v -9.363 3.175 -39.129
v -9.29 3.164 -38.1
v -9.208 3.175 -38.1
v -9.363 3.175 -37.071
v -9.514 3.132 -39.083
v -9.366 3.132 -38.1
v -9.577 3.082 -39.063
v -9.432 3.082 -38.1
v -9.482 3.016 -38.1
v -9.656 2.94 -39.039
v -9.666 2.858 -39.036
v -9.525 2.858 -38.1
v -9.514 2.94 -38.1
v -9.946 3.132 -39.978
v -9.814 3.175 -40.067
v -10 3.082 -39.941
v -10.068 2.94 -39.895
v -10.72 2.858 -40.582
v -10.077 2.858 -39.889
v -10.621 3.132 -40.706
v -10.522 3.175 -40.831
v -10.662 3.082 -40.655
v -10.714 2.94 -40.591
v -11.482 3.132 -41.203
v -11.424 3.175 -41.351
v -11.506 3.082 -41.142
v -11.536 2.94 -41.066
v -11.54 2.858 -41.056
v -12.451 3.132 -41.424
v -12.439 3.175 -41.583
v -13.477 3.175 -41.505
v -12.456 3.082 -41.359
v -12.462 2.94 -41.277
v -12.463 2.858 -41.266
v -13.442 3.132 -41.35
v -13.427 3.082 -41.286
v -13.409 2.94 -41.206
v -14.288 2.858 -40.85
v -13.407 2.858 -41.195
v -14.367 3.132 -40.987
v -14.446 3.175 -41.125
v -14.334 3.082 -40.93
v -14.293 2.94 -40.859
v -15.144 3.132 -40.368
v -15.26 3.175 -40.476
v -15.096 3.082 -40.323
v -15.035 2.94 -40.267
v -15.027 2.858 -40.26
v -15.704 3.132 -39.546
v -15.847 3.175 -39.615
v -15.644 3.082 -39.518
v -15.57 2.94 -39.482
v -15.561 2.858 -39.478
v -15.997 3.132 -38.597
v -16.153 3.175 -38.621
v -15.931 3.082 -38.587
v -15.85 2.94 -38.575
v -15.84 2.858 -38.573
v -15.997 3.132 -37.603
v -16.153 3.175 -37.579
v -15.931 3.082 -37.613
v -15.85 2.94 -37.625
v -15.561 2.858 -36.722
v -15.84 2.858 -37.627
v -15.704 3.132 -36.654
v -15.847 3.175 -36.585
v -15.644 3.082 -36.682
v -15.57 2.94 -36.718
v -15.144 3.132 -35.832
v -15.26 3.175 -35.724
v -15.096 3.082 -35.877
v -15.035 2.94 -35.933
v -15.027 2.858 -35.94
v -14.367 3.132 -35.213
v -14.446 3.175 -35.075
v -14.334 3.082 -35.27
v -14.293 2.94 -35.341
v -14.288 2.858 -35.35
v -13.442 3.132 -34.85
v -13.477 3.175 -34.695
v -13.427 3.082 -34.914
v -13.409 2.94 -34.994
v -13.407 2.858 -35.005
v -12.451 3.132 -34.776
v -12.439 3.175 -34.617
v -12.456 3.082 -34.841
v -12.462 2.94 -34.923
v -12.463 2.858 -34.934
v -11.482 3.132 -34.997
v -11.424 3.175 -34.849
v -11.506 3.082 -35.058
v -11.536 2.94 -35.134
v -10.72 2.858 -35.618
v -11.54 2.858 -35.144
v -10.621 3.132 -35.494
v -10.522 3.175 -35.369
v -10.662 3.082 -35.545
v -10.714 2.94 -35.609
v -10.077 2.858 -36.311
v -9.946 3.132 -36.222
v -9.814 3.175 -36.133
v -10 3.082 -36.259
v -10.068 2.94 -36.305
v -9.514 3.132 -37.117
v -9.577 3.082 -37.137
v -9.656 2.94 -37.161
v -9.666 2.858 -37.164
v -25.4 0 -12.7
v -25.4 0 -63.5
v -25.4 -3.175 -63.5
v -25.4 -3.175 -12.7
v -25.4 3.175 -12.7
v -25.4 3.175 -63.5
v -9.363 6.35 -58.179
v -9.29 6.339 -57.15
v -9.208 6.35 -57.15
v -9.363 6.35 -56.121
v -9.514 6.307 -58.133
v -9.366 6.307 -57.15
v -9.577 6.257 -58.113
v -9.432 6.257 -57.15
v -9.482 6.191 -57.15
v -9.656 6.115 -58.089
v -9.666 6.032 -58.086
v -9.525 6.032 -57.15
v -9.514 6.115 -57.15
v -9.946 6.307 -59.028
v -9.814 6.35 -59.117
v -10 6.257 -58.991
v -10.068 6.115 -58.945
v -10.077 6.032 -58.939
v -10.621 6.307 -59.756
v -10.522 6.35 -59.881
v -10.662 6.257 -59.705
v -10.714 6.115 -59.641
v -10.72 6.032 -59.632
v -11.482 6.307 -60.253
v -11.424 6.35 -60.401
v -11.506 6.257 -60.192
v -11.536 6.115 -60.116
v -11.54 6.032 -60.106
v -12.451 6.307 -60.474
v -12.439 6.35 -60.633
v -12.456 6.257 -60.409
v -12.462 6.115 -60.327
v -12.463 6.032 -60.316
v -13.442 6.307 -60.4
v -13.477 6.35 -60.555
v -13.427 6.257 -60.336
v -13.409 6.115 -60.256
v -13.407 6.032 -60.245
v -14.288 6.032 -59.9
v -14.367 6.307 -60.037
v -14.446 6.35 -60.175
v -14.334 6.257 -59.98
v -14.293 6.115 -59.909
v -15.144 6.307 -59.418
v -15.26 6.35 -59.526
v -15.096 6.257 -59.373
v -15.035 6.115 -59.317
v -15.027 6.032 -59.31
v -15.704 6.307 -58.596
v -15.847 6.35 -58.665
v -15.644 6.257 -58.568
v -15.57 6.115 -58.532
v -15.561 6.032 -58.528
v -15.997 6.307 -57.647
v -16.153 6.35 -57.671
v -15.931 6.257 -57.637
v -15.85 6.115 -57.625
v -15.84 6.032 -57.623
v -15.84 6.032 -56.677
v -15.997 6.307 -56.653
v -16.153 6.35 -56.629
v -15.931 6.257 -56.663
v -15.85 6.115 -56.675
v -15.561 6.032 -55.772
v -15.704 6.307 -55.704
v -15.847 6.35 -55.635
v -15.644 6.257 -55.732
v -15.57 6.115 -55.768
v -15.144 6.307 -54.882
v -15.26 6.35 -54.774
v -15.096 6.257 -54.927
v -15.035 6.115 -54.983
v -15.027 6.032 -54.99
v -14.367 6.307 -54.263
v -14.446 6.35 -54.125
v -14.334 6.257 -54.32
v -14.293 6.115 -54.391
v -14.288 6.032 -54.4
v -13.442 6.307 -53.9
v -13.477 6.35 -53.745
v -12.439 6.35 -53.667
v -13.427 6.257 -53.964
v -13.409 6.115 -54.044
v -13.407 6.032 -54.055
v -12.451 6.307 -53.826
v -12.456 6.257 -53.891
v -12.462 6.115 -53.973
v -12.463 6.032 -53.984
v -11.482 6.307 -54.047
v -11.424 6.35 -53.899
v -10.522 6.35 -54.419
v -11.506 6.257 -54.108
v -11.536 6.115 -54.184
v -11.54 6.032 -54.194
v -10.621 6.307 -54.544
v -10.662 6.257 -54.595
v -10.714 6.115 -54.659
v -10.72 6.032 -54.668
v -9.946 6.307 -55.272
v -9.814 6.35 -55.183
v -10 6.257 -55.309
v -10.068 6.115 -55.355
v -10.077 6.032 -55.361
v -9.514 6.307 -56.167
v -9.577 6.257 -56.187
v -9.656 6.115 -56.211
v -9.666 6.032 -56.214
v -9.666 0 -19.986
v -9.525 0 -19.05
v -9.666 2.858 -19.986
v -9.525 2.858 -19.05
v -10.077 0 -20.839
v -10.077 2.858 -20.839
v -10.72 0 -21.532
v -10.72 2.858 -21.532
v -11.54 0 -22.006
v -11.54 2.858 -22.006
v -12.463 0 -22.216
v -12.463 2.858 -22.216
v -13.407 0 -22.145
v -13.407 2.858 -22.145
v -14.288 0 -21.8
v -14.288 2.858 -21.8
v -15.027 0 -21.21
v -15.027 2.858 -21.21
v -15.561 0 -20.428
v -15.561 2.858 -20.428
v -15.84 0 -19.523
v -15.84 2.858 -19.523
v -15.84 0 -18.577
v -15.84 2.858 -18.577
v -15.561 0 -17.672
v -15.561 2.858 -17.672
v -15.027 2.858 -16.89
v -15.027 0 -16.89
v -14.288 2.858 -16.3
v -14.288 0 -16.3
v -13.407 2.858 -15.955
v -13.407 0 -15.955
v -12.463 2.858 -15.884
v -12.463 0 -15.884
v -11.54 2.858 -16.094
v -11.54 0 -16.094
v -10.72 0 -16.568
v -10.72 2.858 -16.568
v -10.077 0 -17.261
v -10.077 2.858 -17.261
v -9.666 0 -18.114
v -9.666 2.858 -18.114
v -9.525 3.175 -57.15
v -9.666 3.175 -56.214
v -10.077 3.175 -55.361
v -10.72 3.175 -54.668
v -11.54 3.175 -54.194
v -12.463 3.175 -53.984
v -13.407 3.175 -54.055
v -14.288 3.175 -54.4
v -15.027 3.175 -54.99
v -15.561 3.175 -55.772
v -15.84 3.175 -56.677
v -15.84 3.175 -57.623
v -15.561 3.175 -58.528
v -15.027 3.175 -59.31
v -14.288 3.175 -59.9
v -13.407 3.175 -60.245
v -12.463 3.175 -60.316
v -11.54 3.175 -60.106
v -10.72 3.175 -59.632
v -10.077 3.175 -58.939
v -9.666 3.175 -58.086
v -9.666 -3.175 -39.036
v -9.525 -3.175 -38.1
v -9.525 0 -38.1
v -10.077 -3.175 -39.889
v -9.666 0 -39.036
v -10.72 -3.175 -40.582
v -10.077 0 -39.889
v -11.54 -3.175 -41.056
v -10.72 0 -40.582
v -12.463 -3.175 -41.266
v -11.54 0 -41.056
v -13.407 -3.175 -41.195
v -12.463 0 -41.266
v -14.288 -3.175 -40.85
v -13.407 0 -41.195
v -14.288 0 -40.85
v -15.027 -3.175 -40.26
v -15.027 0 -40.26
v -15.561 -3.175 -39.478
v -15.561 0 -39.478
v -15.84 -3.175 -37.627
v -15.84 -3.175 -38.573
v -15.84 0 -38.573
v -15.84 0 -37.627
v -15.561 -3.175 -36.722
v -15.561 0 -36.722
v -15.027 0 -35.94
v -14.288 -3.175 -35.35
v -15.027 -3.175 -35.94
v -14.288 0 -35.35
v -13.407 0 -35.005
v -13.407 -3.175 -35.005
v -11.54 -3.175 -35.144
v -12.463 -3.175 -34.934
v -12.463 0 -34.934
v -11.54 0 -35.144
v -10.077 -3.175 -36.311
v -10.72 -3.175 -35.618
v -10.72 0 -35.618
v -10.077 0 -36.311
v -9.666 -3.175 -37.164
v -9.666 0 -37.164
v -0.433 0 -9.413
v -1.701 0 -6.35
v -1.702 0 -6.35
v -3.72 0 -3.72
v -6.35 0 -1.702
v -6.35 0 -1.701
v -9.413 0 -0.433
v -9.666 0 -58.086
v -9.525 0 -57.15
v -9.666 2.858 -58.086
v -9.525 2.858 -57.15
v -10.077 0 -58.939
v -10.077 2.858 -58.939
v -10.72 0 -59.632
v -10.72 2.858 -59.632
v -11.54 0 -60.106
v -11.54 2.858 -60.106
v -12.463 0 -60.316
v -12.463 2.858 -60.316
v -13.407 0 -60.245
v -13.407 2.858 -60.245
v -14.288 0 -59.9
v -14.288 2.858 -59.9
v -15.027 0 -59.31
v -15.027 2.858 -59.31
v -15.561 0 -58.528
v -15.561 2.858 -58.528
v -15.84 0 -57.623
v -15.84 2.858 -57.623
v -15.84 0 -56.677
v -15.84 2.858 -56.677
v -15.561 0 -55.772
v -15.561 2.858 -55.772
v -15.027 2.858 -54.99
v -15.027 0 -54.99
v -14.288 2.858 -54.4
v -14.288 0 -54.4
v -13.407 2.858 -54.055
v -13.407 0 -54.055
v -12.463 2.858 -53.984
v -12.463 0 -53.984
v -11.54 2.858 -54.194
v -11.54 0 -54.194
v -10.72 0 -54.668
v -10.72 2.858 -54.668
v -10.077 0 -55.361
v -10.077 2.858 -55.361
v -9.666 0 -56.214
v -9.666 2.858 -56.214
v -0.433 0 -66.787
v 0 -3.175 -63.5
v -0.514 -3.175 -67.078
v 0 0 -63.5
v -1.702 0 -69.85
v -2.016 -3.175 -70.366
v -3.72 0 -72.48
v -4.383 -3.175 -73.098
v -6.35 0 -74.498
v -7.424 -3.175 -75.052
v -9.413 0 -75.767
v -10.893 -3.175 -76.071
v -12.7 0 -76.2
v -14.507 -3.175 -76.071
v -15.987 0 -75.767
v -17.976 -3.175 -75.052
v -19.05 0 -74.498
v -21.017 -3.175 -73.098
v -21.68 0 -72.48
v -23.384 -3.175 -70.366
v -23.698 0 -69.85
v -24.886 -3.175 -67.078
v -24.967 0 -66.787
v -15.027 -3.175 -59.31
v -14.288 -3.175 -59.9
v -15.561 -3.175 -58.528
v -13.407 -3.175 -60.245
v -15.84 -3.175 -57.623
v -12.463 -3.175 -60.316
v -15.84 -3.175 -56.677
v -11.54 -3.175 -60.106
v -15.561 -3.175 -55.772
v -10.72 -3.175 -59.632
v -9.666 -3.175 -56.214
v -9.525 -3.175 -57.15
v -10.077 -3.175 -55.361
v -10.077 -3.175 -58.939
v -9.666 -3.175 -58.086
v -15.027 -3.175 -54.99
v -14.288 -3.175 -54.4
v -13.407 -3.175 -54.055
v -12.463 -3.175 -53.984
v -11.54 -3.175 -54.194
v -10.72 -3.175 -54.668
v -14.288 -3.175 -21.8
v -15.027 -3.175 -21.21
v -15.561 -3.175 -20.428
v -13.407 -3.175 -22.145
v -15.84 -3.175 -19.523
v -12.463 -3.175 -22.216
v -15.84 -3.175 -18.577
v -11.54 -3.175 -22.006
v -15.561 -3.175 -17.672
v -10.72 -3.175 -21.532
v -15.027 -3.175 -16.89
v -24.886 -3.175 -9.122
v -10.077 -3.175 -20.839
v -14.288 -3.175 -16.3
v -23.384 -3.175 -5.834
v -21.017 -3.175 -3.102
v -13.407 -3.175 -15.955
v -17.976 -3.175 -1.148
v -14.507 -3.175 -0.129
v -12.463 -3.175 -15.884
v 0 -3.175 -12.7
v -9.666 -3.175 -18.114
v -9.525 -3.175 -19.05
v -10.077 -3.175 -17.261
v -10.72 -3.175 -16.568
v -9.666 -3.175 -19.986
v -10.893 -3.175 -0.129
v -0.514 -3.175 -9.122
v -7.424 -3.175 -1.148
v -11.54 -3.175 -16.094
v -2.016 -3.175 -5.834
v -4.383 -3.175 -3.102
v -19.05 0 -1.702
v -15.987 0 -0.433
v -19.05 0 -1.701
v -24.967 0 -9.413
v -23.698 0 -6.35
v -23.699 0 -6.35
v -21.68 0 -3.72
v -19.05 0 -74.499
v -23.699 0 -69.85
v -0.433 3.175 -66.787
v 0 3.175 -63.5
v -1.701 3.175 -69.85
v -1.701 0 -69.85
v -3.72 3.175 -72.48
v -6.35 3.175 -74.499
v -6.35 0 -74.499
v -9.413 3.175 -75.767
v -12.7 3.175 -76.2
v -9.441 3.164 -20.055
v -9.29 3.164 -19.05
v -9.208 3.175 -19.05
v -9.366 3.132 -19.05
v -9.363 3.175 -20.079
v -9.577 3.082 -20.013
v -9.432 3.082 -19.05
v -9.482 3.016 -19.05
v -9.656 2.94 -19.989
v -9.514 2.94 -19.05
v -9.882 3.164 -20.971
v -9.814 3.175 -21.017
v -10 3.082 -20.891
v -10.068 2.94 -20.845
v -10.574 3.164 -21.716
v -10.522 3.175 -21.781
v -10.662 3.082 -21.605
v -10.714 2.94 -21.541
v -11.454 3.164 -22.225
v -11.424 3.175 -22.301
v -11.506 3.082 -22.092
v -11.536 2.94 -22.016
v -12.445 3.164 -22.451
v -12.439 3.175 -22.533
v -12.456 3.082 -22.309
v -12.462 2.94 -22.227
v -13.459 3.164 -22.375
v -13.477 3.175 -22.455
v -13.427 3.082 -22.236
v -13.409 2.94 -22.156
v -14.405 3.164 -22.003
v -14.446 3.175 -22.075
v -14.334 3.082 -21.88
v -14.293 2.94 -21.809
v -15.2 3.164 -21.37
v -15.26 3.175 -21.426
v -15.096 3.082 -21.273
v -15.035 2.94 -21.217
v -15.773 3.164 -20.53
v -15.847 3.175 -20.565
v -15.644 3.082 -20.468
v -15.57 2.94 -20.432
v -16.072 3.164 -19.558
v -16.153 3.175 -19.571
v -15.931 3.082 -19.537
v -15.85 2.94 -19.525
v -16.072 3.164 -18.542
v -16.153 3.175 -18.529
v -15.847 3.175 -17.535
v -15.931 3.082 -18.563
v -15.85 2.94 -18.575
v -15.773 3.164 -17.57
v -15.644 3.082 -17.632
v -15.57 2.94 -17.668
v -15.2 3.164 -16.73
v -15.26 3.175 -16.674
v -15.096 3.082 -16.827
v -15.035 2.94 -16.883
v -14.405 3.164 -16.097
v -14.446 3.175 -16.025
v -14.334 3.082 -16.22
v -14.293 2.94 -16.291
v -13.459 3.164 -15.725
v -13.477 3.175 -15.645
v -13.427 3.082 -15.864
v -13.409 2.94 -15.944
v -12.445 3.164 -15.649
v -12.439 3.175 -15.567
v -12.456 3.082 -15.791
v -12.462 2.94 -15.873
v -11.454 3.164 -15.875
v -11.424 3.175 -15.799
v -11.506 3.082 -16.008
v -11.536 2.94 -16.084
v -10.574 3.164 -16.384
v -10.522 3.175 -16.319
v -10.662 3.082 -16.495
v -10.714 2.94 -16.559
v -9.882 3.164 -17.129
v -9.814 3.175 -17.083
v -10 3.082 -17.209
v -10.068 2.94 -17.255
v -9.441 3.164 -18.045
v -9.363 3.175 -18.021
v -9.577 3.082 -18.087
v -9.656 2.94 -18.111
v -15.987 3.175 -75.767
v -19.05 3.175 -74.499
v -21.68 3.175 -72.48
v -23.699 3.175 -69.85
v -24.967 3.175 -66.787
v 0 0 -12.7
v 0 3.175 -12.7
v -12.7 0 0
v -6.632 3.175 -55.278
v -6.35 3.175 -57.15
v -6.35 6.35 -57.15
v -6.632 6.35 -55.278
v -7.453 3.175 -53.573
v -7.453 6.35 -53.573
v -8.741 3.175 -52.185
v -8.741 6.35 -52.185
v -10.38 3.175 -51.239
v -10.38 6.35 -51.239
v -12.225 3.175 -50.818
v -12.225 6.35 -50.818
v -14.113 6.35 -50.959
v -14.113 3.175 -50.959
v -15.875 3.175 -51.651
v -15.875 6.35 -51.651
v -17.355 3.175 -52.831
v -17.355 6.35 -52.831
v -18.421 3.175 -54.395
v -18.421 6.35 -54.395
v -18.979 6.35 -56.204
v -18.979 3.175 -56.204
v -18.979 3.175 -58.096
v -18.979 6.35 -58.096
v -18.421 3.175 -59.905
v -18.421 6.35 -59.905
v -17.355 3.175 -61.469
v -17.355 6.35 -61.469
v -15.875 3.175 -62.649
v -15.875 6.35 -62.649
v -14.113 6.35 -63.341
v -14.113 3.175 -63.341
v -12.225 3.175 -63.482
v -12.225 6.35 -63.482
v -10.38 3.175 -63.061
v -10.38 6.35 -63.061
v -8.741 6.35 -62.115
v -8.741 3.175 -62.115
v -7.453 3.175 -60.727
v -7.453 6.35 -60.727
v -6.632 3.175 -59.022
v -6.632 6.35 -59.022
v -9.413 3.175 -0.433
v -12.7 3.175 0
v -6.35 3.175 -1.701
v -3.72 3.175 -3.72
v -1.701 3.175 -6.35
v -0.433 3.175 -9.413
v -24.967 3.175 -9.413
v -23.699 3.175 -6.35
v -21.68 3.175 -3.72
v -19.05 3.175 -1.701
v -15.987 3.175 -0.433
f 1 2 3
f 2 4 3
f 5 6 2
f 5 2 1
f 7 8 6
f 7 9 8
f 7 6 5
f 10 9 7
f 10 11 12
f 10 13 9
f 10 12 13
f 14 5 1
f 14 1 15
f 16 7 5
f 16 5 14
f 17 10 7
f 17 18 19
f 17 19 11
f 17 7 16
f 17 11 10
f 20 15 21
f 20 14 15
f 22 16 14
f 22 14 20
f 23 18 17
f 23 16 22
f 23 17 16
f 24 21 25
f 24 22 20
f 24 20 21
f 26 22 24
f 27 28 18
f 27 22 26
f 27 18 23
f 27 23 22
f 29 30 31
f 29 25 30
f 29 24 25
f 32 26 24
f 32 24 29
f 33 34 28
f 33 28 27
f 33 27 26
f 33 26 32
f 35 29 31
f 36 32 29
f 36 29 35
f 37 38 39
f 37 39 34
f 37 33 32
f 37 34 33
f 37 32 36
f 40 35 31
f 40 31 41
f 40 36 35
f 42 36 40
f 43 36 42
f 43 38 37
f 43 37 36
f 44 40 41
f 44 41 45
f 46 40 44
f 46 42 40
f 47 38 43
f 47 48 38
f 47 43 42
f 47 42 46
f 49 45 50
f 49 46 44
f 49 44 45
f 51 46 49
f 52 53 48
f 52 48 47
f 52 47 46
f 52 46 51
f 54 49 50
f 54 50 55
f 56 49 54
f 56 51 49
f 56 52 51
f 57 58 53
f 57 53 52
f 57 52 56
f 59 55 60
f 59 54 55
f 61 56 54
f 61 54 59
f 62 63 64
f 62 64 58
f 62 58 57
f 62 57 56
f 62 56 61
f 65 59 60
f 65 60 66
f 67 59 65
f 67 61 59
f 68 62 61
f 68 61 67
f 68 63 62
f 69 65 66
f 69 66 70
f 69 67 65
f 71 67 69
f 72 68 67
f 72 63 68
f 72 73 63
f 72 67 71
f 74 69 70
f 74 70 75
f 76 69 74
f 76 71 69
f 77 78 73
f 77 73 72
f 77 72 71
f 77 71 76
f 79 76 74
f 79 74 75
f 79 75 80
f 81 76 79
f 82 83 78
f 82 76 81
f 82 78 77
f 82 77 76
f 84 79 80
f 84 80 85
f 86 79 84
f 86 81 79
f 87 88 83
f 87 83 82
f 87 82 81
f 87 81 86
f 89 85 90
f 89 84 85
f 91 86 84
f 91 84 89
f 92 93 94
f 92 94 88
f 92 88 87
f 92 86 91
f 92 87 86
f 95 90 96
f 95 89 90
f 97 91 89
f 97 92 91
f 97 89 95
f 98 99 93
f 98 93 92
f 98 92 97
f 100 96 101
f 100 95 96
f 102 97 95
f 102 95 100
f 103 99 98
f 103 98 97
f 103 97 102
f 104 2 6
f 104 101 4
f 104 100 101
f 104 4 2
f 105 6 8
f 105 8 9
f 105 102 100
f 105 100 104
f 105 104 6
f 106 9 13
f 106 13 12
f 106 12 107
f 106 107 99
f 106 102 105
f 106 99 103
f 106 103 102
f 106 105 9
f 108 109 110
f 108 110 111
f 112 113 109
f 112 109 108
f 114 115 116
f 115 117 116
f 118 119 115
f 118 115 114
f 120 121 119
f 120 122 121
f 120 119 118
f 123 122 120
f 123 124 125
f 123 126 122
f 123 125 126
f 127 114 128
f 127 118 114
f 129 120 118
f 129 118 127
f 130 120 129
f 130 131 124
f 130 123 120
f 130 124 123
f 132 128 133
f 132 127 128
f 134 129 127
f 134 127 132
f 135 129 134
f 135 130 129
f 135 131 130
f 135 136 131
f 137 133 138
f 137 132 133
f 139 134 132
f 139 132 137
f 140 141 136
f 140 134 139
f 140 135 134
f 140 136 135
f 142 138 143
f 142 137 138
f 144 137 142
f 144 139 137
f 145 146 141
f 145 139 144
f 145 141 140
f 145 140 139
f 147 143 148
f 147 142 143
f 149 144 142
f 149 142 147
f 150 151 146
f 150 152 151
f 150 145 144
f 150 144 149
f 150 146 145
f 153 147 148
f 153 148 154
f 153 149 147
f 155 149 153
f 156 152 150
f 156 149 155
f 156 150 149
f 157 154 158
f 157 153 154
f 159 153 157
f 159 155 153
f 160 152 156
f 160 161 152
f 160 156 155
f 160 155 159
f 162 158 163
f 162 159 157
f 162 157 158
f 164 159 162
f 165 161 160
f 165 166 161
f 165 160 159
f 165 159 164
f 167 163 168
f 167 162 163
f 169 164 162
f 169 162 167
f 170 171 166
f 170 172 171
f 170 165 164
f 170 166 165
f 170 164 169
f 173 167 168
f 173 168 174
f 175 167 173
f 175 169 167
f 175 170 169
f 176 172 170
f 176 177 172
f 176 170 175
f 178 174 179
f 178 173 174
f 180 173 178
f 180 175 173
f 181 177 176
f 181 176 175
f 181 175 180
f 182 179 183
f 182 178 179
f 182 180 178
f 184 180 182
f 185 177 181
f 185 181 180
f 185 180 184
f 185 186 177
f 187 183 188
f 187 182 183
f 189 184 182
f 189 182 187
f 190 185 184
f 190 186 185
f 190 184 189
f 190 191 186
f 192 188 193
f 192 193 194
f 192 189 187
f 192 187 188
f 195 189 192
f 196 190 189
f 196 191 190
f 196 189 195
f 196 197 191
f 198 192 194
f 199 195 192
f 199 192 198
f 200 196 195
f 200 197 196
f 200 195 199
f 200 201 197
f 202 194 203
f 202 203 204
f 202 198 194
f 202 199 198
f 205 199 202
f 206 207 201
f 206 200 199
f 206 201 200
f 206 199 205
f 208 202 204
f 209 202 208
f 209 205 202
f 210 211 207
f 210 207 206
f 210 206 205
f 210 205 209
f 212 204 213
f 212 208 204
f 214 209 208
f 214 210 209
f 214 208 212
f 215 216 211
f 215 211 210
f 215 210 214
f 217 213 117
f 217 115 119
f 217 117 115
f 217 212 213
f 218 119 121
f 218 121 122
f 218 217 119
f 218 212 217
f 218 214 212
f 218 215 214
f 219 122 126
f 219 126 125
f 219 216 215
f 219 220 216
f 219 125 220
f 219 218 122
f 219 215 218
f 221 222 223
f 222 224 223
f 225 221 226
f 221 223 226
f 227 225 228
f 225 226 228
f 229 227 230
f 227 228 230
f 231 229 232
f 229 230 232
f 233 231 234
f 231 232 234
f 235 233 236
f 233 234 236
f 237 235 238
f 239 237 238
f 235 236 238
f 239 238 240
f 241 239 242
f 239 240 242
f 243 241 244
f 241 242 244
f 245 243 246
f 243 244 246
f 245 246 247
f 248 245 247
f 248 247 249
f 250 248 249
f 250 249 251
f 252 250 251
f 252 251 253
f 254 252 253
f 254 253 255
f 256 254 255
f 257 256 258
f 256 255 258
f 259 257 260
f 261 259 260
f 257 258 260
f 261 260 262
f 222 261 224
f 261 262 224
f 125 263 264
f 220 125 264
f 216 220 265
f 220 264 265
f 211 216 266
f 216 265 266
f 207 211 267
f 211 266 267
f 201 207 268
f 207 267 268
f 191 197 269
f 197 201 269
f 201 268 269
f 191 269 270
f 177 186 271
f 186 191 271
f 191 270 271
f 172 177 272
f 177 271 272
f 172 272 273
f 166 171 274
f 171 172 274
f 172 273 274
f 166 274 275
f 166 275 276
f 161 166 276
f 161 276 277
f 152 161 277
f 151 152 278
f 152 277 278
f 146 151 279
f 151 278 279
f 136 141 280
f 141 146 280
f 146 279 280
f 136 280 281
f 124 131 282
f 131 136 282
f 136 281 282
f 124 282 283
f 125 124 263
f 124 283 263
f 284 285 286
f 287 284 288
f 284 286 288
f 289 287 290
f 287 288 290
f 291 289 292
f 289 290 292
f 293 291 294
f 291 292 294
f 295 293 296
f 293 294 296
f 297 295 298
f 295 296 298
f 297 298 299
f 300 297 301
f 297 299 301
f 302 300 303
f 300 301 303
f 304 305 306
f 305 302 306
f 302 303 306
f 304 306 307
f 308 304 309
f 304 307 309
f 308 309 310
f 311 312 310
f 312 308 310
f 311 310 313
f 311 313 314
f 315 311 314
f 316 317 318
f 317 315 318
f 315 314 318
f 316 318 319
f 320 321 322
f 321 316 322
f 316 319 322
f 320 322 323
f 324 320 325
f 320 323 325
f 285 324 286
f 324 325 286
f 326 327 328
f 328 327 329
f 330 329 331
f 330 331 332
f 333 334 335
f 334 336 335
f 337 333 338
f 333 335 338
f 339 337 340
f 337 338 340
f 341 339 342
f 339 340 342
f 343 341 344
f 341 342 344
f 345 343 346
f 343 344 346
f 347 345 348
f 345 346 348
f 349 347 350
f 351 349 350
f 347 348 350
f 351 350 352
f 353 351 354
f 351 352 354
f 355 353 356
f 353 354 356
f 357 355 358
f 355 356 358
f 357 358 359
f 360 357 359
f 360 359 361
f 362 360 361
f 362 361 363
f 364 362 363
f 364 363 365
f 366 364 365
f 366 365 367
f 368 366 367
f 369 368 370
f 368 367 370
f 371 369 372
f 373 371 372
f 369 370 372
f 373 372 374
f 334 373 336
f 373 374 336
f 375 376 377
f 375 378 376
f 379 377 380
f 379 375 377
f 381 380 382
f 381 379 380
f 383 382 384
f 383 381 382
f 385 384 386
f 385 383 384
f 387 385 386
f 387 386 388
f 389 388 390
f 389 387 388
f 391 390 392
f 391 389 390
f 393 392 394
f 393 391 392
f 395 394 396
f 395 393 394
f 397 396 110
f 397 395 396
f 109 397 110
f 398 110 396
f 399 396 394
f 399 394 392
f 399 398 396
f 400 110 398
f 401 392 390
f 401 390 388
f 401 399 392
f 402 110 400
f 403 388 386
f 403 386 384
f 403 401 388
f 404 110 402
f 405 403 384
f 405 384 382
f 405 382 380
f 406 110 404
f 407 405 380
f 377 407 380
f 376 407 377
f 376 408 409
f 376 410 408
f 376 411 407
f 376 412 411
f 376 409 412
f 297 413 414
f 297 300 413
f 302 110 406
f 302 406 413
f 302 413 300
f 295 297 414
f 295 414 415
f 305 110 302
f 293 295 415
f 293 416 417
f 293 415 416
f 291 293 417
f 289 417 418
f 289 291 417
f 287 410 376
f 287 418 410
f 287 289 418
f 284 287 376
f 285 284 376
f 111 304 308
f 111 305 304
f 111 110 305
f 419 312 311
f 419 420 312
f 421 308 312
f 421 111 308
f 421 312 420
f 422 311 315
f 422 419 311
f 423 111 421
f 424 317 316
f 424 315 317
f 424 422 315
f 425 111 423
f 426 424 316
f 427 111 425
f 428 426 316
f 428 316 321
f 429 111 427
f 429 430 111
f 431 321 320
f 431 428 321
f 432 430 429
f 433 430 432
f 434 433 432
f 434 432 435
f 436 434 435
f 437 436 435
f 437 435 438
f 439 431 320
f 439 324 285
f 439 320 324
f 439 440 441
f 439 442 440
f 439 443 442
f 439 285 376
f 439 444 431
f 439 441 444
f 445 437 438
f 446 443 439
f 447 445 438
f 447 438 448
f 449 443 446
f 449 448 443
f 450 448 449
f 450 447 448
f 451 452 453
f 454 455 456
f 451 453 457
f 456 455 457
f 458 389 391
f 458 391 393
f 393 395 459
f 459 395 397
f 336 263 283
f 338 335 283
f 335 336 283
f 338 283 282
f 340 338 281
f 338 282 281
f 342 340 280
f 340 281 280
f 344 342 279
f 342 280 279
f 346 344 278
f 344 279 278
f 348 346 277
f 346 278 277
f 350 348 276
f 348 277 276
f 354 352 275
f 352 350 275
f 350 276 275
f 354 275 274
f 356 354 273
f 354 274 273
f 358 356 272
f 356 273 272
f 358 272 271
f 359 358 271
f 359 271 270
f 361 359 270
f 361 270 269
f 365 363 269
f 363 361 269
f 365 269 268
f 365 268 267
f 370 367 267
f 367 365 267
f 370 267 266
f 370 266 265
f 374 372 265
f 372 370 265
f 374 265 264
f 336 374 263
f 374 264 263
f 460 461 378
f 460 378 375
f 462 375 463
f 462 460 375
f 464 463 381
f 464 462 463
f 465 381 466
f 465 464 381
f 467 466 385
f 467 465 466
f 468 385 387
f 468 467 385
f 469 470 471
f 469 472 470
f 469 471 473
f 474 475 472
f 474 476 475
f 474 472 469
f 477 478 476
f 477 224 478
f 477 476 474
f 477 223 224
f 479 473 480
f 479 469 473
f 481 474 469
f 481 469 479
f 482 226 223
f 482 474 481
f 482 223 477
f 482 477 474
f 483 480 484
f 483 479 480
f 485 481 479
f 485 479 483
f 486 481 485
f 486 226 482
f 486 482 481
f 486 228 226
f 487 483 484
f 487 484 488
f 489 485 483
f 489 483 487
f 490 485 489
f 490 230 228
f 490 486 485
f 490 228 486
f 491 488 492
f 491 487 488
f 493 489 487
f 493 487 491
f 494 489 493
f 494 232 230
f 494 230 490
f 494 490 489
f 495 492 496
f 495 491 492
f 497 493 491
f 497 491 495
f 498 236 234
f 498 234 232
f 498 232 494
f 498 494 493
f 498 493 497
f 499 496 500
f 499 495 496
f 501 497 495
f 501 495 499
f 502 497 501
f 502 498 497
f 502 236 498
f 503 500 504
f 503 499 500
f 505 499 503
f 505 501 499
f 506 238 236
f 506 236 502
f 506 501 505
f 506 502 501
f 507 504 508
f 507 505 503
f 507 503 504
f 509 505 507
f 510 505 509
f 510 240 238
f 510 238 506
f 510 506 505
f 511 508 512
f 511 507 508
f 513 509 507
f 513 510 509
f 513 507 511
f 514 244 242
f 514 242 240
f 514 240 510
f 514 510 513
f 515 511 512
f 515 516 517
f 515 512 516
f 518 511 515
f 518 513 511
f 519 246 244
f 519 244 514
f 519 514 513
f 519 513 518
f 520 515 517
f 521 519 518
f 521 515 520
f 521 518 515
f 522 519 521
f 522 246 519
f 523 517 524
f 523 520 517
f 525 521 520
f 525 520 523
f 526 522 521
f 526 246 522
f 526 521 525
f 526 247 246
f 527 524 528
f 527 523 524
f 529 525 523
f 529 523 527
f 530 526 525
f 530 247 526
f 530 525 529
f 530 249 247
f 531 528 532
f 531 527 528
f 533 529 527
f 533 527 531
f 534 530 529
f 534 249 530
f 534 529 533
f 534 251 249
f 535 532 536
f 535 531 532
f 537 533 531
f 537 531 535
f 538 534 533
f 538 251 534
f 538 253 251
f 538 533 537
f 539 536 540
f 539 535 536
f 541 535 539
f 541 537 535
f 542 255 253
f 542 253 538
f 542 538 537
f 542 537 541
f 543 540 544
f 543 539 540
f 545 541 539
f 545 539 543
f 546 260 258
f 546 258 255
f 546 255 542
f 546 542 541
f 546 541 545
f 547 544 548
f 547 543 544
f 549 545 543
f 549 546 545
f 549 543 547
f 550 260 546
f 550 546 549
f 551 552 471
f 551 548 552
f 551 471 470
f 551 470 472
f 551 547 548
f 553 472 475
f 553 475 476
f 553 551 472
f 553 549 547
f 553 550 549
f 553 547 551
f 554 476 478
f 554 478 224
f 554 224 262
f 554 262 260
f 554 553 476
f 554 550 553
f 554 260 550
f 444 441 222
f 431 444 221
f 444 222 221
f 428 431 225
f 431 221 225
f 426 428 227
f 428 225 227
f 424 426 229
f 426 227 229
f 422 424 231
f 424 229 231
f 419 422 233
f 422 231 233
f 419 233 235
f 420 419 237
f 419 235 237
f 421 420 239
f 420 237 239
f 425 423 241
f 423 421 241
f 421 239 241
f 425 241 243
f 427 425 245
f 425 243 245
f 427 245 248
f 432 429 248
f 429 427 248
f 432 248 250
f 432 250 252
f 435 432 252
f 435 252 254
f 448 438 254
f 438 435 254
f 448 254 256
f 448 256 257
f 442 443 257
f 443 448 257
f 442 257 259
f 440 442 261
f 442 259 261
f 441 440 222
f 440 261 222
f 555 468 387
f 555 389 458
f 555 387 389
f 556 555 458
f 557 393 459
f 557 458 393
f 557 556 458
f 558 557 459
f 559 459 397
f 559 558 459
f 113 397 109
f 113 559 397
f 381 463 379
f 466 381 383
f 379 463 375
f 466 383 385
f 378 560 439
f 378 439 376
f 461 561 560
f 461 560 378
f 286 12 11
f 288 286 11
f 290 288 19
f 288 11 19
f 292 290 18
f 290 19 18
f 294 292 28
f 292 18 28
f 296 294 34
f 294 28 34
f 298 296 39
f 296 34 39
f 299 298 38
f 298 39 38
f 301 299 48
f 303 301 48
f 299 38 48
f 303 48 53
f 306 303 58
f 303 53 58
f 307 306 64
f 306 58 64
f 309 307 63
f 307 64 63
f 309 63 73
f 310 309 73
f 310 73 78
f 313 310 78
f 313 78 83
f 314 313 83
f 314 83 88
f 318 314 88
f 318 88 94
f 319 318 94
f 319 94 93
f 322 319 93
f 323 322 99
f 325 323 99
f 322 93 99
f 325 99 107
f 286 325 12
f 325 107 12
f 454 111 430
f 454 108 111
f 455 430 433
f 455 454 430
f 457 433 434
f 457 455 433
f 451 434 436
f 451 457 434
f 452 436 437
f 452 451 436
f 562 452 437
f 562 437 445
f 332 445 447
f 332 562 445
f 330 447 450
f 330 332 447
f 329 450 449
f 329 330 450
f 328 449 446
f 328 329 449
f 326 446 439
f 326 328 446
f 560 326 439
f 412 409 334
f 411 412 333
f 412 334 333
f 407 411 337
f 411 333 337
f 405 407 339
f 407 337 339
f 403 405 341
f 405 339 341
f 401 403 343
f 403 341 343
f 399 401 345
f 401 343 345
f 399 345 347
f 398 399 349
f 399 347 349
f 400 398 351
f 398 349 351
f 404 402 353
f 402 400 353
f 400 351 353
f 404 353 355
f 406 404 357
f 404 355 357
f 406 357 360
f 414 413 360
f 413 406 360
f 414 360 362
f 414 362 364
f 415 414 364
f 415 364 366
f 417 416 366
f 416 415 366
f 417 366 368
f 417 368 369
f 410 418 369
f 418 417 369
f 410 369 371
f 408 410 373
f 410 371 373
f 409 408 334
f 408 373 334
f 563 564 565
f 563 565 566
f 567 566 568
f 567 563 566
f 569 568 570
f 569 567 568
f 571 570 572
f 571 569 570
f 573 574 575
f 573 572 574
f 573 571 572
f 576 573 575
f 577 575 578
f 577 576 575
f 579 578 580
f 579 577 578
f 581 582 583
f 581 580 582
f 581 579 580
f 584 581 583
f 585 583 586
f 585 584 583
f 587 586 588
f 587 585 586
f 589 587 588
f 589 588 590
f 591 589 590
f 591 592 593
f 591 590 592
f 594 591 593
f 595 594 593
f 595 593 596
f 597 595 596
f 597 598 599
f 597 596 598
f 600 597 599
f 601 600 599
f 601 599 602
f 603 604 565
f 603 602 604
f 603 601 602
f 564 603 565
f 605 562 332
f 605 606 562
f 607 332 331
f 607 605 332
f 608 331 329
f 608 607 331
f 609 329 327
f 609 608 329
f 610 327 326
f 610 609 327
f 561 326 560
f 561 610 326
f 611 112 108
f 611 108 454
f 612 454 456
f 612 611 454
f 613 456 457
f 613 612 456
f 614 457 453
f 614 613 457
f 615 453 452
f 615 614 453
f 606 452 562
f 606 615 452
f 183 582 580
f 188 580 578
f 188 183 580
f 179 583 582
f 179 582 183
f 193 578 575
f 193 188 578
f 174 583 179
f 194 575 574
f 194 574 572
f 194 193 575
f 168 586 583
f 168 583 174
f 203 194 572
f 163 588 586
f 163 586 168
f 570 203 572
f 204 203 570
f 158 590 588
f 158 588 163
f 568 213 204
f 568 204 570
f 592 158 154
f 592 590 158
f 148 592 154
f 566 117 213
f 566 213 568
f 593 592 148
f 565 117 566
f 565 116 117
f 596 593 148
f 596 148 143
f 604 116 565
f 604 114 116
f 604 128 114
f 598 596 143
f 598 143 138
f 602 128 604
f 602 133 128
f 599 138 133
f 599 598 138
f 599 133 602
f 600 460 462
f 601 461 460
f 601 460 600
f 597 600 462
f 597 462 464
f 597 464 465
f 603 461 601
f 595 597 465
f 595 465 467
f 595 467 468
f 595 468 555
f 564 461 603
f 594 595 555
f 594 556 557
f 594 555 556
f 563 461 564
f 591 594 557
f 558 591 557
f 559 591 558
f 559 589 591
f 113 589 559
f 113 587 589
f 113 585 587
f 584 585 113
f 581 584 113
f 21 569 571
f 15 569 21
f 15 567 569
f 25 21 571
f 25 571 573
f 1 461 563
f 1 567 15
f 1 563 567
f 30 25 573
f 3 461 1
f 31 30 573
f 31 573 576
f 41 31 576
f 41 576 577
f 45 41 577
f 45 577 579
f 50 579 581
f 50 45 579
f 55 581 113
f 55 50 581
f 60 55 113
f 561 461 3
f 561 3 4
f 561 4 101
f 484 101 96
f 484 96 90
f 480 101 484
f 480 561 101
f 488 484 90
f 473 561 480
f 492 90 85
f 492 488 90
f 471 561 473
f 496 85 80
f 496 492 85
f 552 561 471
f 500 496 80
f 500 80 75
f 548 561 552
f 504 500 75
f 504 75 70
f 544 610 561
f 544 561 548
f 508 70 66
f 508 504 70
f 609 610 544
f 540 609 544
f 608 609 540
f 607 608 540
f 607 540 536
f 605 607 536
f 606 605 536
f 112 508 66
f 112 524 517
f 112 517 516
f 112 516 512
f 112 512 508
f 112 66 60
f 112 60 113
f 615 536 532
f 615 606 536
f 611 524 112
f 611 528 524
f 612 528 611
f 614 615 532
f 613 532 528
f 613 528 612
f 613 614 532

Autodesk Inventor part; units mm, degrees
ref_plane "YZ Plane" through (0, 0, 0) normal (1, 0, 0) x (0, 1, 0)
ref_plane "XZ Plane" through (0, 0, 0) normal (0, 1, 0) x (-1, 0, 0)
ref_plane "XY Plane" through (0, 0, 0) normal (0, 0, 1) x (1, 0, 0)
sketch "Sketch1" plane through (0, 0, 0) normal (0, 1, 0) x (-1, 0, 0)
  line L0 (0, 0) -> (25.4, 0)
  line L1 (25.4, 0) -> (25.4, -76.2)
  line L2 (25.4, -76.2) -> (0, -76.2)
  line L3 (0, -76.2) -> (0, 0)
  dimension "d0" = 25.4
  dimension "d1" = 76.2
extrude "Extrusion1" add sketch "Sketch1" along normal blind 3.175
sketch "Sketch2" plane through (0, 3.175, 0) normal (0, 1, 0) x (1, 0, 0)
  line L0 (-25.4, 76.2) -> (-25.4, 0) projected
  line L1 (0, 76.2) -> (-25.4, 76.2) projected
  line L2 (-25.4, 0) -> (0, 76.2)
  line L3 (0, 76.2) -> (-25.4, 76.2)
  line L4 (-25.4, 76.2) -> (0, 0)
  line L5 (0, 0) -> (-12.7, 38.1)
  line L6 (-25.4, 0) -> (0, 0) projected
  line L7 (-12.7, 0) -> (-12.7, 76.2)
  circle A0 centre (-12.7, 38.1) radius 3.175
  line L8 (-12.7, 38.1) -> (-12.7, 0)
  circle A1 centre (-12.7, 19.05) radius 3.175
  line L9 (-12.7, 38.1) -> (-12.7, 76.2)
  circle A2 centre (-12.7, 57.15) radius 3.175
  dimension "d4" = 6.35
  dimension "d5" = 6.35
  dimension "d6" = 6.35
extrude "Extrusion2" cut sketch "Sketch2" against normal blind 3.175 contours A0 L7 L4 | L4 L2 A0 | L2 L7 A0 | A2 L7 | L7 A2 | L7 A0 L2 | L2 A0 L4 | L4 A0 L7 | A1 L7 | L7 A1
fillet "Fillet1" radius 12.7 4 edges at (0, 1.5875, 0) (-25.4, 1.5875, 0) (0, 1.5875, -76.2) (-25.4, 1.5875, -76.2)
fillet "Fillet2" radius 0.3175 3 edges at (-15.875, 3.175, -57.15) (-15.875, 3.175, -38.1) (-15.875, 3.175, -19.05)
sketch "Sketch3" plane through (0, 3.175, 0) normal (0, 1, 0) x (1, 0, 0)
  circle A0 centre (-12.7, 57.15) radius 3.175 projected
  circle A1 centre (-12.7, 57.15) radius 6.35
  point P0 (0, 0)
  dimension "d11" = 12.7
extrude "Extrusion3" add sketch "Sketch3" along normal blind 3.175
sketch "Sketch4" plane through (-12.7, 6.35, -57.15) normal (0, 1, 0) x (1, 0, 0)
  circle A0 centre (0, 0) radius 6.35 projected
  circle A1 centre (0, 0) radius 3.175 projected
  point P0 (12.7, -57.15)
extrude "Extrusion4" add sketch "Sketch4" against normal through all
fillet "Fillet3" radius 0.3175 1 edges at (-15.875, 6.35, -57.15)
sketch "Sketch5" plane through (0, 0, 0) normal (0, -1, 0) x (1, 0, 0)
  circle A0 centre (-12.7, -38.1) radius 3.175 projected
  circle A1 centre (-12.7, -19.05) radius 3.175 projected
  arc A2 (-25.4, -63.5) -> (0, -63.5) centre (-12.7, -63.5) ccw projected
  line L0 (0, -12.7) -> (0, -63.5) projected
  arc A3 (0, -12.7) -> (-25.4, -12.7) centre (-12.7, -12.7) ccw projected
  line L1 (-25.4, -63.5) -> (-25.4, -12.7) projected
  circle A4 centre (-12.7, -57.15) radius 3.175 projected
  point P0 (0, 0)
extrude "Extrusion5" add sketch "Sketch5" along normal blind 3.175
properties part number "Board"
